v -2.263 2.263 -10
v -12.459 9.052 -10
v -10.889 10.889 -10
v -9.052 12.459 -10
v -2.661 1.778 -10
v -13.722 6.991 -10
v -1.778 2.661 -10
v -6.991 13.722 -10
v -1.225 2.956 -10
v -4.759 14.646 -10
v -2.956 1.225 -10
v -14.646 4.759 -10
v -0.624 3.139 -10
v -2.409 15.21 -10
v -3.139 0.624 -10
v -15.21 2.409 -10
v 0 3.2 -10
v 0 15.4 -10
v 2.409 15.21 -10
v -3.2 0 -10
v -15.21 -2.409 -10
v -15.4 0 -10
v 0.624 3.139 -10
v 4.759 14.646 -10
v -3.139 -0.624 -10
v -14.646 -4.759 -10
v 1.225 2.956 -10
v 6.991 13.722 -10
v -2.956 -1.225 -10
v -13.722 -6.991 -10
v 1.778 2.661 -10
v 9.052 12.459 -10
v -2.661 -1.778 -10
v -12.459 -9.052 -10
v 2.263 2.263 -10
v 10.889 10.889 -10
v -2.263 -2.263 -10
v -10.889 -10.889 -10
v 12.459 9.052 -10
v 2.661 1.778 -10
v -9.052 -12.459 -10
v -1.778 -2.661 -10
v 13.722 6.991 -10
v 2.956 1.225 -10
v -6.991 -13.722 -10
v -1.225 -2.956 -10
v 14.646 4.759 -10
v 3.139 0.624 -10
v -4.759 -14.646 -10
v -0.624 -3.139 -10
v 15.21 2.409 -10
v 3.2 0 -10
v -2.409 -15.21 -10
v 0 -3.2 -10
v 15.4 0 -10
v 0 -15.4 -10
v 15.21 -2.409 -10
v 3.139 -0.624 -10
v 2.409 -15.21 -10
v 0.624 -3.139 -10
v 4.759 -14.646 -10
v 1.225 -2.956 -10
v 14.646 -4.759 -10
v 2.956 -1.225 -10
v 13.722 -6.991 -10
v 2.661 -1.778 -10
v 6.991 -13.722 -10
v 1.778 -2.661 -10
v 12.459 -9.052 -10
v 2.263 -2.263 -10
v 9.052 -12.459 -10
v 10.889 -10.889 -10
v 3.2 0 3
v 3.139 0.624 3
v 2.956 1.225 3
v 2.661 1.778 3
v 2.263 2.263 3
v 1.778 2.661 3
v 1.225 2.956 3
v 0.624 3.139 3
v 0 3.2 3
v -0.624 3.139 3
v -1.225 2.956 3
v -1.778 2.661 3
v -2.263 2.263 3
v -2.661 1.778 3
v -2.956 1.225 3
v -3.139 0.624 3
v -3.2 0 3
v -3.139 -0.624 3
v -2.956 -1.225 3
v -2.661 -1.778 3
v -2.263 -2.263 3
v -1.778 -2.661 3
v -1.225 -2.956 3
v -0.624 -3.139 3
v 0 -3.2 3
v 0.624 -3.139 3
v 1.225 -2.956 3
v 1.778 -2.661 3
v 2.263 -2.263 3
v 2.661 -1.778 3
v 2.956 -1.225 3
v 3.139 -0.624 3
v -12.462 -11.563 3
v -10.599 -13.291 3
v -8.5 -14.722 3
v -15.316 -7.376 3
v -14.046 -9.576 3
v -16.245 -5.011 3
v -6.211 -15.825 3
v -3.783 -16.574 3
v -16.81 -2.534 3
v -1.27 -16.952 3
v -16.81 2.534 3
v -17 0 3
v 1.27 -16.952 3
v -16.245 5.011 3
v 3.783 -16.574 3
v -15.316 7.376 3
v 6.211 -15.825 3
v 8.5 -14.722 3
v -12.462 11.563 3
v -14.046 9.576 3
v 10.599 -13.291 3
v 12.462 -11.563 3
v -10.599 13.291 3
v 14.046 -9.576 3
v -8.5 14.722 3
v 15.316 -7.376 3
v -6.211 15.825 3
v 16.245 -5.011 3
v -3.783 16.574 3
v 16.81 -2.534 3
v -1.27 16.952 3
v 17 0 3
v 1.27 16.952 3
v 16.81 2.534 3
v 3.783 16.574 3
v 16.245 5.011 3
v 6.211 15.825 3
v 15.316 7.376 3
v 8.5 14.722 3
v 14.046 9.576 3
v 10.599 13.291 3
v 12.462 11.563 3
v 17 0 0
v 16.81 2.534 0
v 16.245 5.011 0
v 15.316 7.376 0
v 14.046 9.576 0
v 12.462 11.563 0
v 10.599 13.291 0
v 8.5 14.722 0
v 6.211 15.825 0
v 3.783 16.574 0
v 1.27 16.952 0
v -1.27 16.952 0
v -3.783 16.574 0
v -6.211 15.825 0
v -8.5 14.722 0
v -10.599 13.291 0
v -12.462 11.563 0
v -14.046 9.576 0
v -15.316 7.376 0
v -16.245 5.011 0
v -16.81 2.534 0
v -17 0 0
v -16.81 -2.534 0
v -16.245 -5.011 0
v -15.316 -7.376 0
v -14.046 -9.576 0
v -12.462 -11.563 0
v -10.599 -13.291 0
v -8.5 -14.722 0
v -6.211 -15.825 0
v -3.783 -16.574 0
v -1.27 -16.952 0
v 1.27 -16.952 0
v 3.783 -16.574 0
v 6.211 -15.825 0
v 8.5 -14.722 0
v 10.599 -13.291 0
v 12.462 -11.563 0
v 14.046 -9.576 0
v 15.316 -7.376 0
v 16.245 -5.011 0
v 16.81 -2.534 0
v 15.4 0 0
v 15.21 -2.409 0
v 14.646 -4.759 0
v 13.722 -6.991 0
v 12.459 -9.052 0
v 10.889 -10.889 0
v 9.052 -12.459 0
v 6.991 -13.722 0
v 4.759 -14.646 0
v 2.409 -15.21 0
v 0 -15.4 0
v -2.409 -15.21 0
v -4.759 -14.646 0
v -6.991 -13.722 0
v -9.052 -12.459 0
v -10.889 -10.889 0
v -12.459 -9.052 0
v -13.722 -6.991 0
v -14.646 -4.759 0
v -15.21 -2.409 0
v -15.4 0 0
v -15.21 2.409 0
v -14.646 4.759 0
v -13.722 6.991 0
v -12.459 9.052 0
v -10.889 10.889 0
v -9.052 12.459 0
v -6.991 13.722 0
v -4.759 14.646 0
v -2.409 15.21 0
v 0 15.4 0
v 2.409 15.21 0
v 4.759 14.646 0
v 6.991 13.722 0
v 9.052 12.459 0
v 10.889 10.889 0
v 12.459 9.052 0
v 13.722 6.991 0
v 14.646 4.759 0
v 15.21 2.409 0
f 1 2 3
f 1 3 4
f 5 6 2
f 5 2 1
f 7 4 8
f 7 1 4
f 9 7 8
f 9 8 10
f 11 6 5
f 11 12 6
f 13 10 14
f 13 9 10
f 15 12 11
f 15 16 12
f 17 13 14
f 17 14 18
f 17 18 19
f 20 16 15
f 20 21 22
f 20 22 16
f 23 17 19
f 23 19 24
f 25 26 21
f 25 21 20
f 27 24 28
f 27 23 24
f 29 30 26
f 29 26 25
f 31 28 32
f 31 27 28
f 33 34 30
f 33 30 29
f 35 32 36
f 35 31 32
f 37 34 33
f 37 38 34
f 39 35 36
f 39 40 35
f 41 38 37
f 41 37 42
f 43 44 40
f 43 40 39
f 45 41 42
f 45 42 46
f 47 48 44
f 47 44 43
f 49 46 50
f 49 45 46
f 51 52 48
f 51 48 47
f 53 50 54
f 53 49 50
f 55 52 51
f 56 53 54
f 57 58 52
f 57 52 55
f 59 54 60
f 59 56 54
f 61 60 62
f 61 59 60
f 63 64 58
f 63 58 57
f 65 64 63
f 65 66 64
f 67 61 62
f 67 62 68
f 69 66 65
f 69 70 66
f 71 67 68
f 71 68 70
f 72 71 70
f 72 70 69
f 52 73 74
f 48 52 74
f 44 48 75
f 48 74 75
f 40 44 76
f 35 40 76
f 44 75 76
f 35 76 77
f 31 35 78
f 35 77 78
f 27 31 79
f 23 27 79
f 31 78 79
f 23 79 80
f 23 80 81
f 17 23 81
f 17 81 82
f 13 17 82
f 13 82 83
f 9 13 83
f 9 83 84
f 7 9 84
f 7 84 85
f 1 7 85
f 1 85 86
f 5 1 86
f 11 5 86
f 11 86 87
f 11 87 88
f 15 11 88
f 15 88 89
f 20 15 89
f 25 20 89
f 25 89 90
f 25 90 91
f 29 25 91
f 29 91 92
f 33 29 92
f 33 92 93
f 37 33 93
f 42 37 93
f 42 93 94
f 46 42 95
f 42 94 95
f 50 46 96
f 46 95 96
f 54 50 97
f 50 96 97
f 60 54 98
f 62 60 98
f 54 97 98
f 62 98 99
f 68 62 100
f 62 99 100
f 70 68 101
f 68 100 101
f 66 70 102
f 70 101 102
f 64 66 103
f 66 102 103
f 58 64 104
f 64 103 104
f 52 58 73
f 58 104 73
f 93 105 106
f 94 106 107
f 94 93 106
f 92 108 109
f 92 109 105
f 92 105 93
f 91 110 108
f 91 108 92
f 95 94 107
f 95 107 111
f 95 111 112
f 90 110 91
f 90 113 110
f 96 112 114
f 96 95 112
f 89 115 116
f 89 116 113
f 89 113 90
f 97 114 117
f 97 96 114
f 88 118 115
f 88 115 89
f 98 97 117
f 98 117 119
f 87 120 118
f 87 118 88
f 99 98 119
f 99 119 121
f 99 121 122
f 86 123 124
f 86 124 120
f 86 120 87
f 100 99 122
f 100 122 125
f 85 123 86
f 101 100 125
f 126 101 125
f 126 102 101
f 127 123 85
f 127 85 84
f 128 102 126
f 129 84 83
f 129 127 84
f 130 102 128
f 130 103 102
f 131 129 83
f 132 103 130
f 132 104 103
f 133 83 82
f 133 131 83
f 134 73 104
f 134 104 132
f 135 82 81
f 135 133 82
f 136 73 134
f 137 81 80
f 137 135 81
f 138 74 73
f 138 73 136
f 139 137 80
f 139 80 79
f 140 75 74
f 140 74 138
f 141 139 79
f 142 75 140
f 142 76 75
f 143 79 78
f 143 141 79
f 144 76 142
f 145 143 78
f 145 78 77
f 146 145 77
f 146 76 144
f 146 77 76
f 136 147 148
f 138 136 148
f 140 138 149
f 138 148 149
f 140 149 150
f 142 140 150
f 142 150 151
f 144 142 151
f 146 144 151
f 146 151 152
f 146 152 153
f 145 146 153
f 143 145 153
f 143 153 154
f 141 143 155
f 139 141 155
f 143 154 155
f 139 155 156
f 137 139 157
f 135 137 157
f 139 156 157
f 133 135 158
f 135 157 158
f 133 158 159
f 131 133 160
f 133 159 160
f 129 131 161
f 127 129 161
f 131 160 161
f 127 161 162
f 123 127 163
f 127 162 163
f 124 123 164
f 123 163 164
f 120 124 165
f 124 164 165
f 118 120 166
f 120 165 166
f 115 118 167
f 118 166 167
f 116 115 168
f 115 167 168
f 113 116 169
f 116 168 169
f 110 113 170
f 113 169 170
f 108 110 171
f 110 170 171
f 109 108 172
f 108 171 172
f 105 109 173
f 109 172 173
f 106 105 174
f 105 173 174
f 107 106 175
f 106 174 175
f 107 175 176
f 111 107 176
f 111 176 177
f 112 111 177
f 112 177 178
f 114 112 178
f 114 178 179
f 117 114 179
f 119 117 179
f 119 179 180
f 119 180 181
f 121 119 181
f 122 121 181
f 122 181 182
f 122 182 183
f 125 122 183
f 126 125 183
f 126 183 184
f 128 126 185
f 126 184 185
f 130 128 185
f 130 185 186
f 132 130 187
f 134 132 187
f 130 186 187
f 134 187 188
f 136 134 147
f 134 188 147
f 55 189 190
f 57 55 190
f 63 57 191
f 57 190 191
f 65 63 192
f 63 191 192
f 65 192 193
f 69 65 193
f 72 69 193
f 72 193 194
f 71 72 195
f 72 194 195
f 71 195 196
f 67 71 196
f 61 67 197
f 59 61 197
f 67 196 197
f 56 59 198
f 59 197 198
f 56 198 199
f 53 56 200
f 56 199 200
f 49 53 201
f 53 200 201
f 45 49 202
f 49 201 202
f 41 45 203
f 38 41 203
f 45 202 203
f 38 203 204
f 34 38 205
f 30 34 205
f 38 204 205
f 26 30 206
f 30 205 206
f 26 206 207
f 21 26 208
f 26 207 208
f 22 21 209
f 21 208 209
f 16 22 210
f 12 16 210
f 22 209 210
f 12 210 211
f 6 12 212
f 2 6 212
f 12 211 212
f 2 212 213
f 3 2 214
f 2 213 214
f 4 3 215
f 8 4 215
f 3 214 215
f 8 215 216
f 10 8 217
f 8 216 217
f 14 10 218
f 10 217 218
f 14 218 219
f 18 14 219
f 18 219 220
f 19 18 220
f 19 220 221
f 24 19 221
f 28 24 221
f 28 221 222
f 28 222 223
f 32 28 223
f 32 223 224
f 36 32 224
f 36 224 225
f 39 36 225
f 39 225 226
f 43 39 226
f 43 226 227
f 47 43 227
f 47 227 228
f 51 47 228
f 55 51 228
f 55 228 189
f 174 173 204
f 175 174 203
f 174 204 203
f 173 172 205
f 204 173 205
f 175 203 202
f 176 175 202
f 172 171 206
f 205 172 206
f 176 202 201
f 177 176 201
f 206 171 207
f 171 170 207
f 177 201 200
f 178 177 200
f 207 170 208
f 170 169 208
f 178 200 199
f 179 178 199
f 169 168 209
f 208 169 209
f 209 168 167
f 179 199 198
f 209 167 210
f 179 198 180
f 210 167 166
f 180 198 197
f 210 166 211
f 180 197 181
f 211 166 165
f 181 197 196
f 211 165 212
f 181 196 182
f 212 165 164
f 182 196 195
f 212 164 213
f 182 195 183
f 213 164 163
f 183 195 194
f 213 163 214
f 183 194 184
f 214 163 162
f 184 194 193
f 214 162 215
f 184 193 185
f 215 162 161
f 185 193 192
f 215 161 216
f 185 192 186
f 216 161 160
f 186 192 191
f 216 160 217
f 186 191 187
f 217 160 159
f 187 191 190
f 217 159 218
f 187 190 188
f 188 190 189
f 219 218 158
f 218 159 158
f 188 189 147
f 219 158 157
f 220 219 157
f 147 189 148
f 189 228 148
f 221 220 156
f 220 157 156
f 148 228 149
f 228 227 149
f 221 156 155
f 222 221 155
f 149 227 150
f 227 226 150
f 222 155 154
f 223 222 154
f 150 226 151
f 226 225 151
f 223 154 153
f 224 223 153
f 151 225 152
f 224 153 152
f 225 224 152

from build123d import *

# Parameters (mm, degrees)
SKETCH_R     = 17
PAD_DEPTH    = 3
SKETCH001_R  = 15.4
PAD001_DEPTH = 10
SKETCH002_R  = 3.2
POCKET_DEPTH = 13.001


with BuildPart() as part:
    # Sketch → Pad (new body)
    with BuildSketch(Plane.XY):
        Circle(SKETCH_R)
    extrude(amount=PAD_DEPTH)

    # Sketch001 (on Face2 of Pad) → Pad001 (join)
    with BuildSketch(Plane(origin=(0, 0, 0), x_dir=(1, 0, 0), z_dir=(0, 0, -1))):
        Circle(SKETCH001_R)
    extrude(amount=PAD001_DEPTH)

    # Sketch002 → Pocket (cut, through all)
    with BuildSketch(Plane.XY.offset(3)):
        Circle(SKETCH002_R)
    extrude(amount=-POCKET_DEPTH, mode=Mode.SUBTRACT)


solid = part.part
